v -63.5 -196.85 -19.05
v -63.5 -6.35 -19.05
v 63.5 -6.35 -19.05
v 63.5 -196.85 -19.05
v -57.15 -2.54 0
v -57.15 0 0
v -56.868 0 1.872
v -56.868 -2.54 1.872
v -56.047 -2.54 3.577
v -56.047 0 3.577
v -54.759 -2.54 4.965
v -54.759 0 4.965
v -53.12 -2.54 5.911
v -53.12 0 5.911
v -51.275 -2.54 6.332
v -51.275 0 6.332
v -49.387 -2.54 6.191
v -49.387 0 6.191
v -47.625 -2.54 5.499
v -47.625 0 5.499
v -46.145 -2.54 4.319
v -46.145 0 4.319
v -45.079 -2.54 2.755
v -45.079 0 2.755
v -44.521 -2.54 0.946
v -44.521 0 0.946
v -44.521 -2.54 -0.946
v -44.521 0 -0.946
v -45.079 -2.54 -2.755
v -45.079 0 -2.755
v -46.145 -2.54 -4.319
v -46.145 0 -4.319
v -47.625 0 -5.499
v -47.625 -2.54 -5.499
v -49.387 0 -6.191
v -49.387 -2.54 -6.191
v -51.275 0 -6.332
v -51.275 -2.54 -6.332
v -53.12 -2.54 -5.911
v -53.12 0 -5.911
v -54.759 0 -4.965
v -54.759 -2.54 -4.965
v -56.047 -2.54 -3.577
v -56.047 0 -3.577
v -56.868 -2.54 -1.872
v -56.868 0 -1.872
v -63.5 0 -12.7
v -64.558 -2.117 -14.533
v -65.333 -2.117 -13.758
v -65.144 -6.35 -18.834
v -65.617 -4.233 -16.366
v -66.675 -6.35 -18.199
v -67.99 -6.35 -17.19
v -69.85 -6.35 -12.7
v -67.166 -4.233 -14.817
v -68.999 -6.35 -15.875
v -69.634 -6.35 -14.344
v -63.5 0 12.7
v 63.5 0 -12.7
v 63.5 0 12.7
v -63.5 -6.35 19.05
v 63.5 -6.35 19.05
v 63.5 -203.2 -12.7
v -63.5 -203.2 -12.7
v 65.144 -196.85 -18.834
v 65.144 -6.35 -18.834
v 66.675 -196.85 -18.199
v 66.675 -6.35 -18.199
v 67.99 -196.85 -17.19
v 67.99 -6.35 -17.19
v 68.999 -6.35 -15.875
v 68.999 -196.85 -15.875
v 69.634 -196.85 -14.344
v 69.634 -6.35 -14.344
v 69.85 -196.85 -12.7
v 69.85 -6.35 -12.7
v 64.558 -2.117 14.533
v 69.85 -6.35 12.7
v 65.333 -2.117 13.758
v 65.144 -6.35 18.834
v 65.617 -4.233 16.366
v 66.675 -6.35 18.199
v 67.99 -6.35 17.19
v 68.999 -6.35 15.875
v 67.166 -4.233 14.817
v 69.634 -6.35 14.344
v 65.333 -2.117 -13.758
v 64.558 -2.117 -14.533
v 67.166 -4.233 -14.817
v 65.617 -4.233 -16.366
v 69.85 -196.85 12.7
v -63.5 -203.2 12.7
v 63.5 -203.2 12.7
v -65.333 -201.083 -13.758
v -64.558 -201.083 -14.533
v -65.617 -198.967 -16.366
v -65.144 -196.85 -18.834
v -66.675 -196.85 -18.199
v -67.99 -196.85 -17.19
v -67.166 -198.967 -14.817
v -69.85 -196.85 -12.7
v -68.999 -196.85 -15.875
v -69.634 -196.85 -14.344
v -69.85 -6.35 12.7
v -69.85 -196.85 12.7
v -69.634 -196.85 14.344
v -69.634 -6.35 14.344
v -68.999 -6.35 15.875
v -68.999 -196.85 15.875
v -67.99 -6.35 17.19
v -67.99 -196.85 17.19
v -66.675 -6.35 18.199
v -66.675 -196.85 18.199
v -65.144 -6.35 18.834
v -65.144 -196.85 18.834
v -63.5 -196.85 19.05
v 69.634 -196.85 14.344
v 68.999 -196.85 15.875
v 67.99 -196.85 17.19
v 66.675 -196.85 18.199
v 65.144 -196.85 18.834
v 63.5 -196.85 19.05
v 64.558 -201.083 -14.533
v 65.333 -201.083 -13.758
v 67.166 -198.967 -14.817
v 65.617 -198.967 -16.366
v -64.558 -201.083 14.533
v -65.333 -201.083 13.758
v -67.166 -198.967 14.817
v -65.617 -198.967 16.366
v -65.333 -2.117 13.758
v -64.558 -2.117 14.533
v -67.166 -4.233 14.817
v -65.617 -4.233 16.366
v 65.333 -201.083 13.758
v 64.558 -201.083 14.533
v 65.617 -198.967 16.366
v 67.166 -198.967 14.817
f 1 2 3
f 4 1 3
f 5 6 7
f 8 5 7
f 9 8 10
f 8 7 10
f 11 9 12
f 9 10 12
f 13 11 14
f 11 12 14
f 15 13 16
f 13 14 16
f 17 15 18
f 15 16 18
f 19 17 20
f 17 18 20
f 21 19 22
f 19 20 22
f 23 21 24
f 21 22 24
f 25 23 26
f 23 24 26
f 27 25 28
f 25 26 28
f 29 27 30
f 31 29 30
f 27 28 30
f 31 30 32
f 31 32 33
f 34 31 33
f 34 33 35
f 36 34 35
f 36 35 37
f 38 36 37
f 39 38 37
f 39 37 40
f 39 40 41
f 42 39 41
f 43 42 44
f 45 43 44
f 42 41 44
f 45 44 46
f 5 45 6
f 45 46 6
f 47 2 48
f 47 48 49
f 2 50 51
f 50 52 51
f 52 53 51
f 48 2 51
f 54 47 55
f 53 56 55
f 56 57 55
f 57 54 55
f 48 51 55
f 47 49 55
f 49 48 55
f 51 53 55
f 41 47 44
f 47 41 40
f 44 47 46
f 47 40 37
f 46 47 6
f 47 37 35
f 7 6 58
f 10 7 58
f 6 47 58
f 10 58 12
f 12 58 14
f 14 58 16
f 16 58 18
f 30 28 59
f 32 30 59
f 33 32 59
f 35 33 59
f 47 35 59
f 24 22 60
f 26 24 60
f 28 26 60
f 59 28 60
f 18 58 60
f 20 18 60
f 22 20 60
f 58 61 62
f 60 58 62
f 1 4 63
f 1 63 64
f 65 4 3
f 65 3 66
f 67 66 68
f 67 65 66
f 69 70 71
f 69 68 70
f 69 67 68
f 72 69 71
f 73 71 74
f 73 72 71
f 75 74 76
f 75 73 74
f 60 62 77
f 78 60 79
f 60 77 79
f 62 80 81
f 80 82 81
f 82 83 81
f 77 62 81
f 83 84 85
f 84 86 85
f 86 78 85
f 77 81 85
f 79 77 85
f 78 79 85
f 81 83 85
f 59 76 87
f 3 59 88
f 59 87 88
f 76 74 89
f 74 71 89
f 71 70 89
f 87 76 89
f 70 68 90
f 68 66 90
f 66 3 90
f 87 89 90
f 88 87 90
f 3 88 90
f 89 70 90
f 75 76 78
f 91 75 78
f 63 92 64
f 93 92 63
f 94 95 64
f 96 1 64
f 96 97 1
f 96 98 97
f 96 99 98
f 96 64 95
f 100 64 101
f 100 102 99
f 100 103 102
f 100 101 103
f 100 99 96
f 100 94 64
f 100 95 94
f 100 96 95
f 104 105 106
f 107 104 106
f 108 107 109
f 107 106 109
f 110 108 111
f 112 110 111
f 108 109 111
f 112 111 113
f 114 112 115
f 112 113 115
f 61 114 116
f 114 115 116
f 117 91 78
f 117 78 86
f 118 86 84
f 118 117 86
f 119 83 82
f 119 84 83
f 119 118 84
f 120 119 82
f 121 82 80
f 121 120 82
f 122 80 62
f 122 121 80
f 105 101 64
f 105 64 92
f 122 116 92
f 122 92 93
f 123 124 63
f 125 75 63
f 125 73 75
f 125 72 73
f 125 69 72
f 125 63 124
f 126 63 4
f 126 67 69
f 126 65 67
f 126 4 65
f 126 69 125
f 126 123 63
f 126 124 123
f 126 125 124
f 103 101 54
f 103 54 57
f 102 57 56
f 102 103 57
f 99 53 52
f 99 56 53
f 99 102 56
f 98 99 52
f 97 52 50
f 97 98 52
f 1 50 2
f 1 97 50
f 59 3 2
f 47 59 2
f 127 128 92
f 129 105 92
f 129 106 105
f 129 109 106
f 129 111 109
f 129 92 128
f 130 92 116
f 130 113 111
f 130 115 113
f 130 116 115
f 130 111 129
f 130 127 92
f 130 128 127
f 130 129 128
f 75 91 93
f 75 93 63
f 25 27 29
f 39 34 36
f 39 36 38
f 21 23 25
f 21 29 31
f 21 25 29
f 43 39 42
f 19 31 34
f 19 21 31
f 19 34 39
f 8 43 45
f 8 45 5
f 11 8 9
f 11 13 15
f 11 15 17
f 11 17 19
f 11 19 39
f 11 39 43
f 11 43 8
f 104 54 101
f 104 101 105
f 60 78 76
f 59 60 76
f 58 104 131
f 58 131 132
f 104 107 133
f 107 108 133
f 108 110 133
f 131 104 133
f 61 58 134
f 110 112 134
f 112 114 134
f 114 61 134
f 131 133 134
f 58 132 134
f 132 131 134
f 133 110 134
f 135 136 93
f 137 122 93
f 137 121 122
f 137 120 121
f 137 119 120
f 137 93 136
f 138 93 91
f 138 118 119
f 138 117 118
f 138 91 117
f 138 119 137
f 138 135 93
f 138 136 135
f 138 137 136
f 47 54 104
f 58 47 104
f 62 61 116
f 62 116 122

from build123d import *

# Parameters (mm, degrees)
F0_W     = 139.7
F0_H     = 38.1
F1_DEPTH = 203.2
F2_R     = 6.35
F3_SIZE  = 6.35
F4_SIZE  = 6.35
F5_R     = 6.35
F6_DEPTH = 2.54


with BuildPart() as f1:
    # F0 (on Front) → F1 (new body)
    with BuildSketch(Plane.XZ):
        Rectangle(F0_W, F0_H)
    extrude(amount=F1_DEPTH)

    # F2
    f2_edges = [f1.edges().sort_by_distance(p)[0] for p in [
        (-69.85, -101.6, 19.05),
        (-69.85, -101.6, -19.05),
        (69.85, -101.6, 19.05),
        (69.85, -101.6, -19.05),
    ]]
    fillet(f2_edges, radius=F2_R)

    # F3
    f3_edges = [f1.edges().sort_by_distance(p)[0] for p in [
        (0, -203.2, 19.05),
    ]]
    chamfer(f3_edges, length=F3_SIZE)

    # F4
    f4_edges = [f1.edges().sort_by_distance(p)[0] for p in [
        (0, 0, 19.05),
    ]]
    chamfer(f4_edges, length=F4_SIZE)

    # F5 (on face) → F6 (cut)
    with BuildSketch(Plane(origin=(0, 0, 0), x_dir=(-1, 0, 0), z_dir=(0, 1, 0))):
        with Locations((50.8, 0)):
            Circle(F5_R)
    extrude(amount=-F6_DEPTH, mode=Mode.SUBTRACT)


solid = f1.part
